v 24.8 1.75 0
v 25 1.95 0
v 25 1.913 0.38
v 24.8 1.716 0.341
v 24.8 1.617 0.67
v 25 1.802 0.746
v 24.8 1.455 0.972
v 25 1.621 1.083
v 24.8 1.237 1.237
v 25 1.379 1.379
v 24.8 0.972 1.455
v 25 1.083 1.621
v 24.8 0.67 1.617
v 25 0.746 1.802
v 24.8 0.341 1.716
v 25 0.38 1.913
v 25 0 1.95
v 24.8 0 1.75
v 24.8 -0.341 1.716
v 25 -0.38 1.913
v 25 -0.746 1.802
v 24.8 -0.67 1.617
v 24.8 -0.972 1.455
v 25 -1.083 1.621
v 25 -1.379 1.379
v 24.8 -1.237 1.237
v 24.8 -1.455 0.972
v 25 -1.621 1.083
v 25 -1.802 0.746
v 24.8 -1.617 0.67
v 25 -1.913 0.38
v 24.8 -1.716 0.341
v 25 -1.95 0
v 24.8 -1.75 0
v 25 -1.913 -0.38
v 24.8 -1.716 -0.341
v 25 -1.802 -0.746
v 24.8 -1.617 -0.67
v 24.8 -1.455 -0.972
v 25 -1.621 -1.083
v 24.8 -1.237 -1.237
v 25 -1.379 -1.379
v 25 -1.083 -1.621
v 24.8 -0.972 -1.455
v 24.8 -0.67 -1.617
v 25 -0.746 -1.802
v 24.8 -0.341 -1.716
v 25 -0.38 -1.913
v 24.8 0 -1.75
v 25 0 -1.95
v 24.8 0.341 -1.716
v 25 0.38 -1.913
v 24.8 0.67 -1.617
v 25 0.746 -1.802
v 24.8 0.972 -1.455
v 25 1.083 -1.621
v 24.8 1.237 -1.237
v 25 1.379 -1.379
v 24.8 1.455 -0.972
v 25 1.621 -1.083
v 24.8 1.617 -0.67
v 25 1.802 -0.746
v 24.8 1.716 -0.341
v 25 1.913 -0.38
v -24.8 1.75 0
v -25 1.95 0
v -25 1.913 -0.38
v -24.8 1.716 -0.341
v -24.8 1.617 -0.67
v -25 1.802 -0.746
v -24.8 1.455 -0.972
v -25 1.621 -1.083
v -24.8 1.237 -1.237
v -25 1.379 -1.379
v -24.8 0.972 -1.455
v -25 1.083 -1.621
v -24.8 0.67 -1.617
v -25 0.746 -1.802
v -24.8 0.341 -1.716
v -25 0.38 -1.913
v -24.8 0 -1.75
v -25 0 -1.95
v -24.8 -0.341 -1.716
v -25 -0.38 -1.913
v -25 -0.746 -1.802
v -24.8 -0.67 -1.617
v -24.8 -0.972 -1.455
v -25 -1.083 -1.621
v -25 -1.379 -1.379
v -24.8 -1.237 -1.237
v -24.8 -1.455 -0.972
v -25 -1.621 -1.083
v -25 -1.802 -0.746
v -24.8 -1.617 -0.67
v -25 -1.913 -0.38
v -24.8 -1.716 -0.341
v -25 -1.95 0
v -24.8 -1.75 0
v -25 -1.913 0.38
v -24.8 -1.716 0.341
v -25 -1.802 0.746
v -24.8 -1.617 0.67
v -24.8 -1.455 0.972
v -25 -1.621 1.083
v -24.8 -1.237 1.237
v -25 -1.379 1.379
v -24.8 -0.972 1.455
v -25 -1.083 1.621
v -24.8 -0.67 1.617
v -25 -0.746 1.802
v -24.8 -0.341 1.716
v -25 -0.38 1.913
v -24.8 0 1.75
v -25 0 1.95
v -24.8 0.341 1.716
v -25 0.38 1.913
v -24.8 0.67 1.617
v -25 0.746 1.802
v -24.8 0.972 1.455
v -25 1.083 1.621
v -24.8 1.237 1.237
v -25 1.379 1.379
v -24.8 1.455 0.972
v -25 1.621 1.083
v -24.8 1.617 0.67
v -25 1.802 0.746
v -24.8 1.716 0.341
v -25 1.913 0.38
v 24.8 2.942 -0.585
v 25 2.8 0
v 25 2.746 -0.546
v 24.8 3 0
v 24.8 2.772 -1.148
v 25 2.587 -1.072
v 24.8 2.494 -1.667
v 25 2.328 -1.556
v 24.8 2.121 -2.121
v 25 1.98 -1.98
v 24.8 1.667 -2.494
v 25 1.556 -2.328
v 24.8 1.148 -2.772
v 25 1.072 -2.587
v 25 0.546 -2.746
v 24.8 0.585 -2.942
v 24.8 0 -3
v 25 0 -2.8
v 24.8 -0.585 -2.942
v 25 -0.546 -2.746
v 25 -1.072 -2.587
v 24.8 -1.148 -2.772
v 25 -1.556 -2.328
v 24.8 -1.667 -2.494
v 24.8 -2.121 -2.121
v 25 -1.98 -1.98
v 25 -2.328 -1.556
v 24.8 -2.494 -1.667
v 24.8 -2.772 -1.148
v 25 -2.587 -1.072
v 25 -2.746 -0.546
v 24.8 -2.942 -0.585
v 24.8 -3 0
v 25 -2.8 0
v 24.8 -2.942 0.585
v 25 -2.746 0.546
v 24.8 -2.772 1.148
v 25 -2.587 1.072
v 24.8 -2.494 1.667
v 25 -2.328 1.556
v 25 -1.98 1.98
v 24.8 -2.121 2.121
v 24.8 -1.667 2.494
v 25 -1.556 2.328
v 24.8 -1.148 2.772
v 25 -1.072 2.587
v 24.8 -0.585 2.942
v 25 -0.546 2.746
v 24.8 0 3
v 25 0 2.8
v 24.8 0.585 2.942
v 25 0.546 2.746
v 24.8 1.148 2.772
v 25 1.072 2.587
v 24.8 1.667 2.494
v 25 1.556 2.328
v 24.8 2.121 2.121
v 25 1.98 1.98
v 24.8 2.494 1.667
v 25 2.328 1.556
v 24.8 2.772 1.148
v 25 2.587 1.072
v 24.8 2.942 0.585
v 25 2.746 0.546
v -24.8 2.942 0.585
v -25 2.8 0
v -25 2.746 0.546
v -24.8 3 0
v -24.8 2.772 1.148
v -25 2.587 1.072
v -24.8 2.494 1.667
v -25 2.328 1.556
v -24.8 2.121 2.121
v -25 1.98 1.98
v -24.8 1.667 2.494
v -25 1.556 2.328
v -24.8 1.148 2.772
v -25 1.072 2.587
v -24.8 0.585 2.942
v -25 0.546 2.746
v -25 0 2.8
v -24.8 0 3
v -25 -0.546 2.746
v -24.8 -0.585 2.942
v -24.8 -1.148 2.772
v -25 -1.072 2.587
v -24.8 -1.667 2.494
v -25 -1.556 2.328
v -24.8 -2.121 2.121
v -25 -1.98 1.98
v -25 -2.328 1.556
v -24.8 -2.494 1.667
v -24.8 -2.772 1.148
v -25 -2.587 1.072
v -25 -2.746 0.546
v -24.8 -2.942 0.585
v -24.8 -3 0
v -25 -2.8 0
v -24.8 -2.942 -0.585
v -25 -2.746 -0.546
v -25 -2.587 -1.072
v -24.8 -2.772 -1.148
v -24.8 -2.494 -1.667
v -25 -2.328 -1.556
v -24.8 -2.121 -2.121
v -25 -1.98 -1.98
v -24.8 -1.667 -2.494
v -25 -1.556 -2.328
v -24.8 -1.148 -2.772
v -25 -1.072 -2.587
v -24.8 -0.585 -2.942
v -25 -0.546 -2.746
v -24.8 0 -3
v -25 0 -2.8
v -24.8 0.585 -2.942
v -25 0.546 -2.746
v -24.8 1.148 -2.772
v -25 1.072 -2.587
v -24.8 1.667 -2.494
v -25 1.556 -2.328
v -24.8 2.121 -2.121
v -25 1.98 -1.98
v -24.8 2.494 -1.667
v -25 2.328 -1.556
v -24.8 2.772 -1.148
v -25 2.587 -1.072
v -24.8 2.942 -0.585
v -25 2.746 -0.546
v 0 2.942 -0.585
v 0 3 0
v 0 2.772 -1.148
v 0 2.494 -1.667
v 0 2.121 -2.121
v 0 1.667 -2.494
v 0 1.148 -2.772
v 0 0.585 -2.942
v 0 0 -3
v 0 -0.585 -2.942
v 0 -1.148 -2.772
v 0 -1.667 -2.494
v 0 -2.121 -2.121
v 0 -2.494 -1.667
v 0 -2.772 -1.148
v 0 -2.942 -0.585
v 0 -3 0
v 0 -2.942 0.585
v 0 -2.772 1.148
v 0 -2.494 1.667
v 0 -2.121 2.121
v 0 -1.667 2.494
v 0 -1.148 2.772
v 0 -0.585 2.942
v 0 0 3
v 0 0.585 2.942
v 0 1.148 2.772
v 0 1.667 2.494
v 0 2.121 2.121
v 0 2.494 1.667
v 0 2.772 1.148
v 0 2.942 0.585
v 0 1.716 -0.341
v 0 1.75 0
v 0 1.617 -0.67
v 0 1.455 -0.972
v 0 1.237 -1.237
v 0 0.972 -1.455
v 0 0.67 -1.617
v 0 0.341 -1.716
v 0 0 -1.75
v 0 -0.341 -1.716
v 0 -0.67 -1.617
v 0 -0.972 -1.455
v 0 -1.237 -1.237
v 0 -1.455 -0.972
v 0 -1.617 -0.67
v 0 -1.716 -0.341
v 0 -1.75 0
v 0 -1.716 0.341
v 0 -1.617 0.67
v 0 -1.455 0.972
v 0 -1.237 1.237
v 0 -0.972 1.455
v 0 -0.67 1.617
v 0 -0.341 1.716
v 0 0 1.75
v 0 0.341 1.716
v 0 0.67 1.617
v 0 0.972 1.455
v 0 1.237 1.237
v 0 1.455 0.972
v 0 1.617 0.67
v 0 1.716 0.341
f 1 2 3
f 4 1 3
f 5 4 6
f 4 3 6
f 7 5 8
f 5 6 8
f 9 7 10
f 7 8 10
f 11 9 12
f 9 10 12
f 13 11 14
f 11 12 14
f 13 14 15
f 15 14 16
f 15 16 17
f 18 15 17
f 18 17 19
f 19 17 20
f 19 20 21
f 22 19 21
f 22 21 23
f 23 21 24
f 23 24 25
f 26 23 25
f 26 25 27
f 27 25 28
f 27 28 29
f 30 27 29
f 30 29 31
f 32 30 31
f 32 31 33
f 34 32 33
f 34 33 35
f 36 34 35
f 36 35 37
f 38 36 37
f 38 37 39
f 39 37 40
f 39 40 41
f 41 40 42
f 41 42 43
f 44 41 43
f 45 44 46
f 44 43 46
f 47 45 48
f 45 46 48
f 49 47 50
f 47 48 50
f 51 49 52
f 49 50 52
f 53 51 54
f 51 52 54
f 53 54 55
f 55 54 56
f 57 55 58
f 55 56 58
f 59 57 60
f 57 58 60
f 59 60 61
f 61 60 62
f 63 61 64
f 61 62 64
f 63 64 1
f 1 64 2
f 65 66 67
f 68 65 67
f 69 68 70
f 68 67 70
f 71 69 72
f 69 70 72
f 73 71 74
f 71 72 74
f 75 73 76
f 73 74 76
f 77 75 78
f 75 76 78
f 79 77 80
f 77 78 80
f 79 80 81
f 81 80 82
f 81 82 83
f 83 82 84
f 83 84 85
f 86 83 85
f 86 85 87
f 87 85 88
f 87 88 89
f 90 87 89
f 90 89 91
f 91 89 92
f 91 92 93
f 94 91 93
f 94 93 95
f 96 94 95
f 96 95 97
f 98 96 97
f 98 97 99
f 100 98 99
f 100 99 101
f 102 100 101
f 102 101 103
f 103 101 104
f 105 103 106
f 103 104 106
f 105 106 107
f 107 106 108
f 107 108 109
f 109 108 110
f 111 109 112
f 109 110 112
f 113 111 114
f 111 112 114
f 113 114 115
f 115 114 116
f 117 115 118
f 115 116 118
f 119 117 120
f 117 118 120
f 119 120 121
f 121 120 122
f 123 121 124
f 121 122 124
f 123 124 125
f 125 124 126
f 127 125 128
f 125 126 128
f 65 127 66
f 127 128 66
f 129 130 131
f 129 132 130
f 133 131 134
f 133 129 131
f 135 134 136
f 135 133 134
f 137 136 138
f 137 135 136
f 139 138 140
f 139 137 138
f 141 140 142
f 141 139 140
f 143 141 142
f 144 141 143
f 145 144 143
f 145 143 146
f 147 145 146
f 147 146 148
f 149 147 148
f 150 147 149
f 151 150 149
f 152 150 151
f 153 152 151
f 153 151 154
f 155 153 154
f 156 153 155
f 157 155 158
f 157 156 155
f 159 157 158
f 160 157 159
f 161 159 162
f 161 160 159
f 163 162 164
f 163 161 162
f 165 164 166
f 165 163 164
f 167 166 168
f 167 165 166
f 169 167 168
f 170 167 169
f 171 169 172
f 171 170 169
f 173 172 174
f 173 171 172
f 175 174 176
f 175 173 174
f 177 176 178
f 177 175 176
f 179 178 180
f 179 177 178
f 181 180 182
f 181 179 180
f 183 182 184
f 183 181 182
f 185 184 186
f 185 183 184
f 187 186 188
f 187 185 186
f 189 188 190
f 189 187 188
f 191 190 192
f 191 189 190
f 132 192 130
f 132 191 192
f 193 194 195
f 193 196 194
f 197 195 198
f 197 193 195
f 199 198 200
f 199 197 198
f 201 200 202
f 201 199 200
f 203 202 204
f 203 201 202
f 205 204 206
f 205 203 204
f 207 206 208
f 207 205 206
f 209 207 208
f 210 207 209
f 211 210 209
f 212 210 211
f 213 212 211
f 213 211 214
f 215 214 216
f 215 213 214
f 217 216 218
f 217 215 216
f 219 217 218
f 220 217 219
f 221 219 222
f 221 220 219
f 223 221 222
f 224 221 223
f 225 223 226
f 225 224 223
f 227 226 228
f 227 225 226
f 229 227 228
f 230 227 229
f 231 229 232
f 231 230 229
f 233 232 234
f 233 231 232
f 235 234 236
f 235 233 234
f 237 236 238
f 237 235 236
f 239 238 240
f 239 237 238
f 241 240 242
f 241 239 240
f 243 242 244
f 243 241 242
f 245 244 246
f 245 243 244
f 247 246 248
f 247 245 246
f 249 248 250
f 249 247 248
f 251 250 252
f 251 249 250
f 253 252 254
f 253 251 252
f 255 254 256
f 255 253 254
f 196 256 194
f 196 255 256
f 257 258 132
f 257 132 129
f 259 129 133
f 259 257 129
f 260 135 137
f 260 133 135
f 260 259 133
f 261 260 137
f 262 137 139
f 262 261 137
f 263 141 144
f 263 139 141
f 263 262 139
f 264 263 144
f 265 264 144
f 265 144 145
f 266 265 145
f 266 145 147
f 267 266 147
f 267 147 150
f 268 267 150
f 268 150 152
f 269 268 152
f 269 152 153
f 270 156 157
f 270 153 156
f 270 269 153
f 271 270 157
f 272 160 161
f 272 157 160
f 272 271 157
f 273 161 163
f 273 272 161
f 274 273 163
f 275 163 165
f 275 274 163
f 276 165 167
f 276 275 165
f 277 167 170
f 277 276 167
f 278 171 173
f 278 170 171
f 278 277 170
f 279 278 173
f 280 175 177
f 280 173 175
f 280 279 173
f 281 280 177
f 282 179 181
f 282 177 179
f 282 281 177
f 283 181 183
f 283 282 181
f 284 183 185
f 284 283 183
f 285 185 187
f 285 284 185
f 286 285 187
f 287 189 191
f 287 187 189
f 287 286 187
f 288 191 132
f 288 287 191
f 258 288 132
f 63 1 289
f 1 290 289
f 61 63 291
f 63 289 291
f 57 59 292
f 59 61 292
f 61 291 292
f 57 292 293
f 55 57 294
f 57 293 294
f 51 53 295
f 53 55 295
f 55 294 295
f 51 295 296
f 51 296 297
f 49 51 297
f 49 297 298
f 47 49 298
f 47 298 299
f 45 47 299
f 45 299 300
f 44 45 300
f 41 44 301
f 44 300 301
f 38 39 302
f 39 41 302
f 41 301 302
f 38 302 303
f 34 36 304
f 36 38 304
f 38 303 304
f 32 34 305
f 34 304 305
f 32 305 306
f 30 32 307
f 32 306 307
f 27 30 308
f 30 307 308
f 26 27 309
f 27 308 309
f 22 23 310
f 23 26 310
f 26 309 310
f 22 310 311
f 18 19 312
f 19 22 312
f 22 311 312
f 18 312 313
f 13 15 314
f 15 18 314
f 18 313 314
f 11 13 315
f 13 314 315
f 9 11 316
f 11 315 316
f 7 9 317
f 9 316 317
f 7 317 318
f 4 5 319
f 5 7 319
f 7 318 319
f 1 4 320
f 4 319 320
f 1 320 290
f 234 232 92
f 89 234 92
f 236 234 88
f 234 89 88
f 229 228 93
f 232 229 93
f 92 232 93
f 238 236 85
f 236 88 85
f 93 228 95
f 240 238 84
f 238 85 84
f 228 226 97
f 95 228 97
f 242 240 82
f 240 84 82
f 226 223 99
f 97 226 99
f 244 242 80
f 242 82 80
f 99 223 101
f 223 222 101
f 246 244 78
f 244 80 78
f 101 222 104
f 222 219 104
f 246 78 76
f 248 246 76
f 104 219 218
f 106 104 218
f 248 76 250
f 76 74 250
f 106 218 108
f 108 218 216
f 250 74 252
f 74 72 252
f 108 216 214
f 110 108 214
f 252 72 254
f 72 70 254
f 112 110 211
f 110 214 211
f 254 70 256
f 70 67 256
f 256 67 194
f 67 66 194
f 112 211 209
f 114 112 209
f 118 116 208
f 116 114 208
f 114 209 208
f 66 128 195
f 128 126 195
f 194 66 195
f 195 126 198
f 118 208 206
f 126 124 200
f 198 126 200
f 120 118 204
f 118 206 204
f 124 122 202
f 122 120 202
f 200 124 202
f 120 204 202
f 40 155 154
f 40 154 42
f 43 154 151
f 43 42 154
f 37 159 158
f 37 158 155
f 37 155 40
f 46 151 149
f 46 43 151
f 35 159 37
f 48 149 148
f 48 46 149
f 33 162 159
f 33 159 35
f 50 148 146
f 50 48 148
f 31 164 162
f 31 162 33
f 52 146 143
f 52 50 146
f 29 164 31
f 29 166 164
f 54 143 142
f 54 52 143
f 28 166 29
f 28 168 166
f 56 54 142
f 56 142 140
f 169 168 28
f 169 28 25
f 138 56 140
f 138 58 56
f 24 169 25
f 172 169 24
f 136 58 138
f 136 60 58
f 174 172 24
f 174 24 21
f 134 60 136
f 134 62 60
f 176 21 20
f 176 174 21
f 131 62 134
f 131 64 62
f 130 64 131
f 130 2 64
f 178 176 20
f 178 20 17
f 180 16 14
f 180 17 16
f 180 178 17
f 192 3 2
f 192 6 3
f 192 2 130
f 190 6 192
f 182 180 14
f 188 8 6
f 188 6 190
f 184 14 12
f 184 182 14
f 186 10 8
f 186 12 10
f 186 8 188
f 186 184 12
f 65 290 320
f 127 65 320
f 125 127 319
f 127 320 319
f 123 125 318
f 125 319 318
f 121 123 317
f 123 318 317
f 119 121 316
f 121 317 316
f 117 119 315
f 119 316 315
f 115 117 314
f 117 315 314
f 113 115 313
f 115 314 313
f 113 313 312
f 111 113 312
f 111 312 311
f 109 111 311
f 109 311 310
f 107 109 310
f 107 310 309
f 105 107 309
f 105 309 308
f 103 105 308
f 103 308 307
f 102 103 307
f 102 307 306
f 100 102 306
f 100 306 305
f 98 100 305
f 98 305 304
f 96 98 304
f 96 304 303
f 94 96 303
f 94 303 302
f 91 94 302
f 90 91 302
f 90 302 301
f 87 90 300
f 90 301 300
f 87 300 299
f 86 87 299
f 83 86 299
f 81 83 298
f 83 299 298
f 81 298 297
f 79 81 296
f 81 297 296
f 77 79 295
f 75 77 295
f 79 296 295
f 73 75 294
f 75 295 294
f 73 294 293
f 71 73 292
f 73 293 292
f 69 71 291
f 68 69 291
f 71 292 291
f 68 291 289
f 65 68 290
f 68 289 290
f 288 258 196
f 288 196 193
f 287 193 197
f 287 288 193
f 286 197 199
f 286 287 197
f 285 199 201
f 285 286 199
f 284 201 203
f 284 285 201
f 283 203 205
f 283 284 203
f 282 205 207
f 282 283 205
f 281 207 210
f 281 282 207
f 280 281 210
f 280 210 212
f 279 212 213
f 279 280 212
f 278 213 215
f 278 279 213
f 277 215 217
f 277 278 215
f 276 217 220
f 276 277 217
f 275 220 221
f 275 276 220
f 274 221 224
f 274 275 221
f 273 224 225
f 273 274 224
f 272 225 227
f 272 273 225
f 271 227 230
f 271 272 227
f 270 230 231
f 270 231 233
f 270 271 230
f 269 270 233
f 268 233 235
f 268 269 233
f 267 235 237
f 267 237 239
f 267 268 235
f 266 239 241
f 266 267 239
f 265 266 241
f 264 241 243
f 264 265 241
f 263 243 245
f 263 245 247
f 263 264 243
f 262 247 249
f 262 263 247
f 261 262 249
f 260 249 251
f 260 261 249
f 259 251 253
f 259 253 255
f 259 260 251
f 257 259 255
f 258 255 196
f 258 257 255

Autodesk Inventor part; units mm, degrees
ref_plane "YZ Plane" through (0, 0, 0) normal (1, 0, 0) x (0, 1, 0)
ref_plane "XZ Plane" through (0, 0, 0) normal (0, 1, 0) x (-1, 0, 0)
ref_plane "XY Plane" through (0, 0, 0) normal (0, 0, 1) x (1, 0, 0)
sketch "スケッチ1" plane through (0, 0, 0) normal (1, 0, 0) x (0, 1, 0)
  circle A0 centre (0, 0) radius 3
  circle A1 centre (0, 0) radius 1.75
  dimension "d0" = 6
  dimension "d6" = 3.5
extrude "押し出し1" add sketch "スケッチ1" along normal mid plane 50
chamfer "面取り1" distance 0.2 angle 45 4 edges at (25, -3, 0) (-25, -3, 0) (25, -1.75, 0) (-25, -1.75, 0)
properties part number "KNEE_DRIVER_SHAFT"
